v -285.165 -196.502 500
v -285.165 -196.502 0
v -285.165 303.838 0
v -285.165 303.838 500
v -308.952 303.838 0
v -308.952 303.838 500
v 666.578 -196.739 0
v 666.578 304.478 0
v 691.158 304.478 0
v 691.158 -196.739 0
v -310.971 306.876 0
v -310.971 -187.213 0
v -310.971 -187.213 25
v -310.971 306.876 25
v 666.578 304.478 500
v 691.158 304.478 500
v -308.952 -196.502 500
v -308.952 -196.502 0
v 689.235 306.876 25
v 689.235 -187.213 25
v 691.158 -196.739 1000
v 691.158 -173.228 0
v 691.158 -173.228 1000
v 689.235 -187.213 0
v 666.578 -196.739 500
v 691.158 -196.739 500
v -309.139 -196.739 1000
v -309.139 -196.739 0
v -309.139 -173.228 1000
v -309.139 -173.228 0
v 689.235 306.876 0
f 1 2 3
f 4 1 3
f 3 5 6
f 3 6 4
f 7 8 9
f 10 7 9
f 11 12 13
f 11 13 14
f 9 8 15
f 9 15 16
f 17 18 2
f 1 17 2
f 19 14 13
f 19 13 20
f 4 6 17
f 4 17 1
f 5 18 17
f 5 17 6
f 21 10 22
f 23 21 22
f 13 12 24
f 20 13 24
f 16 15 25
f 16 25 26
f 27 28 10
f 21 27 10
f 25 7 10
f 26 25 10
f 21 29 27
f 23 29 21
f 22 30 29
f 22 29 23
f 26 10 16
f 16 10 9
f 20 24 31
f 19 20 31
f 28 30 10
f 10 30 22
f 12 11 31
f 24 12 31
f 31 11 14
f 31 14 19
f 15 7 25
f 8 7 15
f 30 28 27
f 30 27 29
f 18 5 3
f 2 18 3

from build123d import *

# Parameters (mm, degrees)
F2_W     = 23.786694
F2_H     = 500.340388
F3_DEPTH = 500
F4_W     = 24.579943
F4_H     = 501.217544
F5_DEPTH = 500
F6_W     = 1000.297636
F6_H     = 23.511276
F7_DEPTH = 1000
F8_W     = 1000.206262
F8_H     = 494.088978
F9_DEPTH = 25


with BuildPart() as f3:
    # F2 (on face) → F3 (new body)
    with BuildSketch(Plane.XY):
        with Locations((-297.058418, 53.668119)):
            Rectangle(F2_W, F2_H)
    extrude(amount=F3_DEPTH)


with BuildPart() as f5:
    # F4 (on face) → F5 (new body)
    with BuildSketch(Plane.XY):
        with Locations((678.868323, 53.869456)):
            Rectangle(F4_W, F4_H)
    extrude(amount=F5_DEPTH)


with BuildPart() as f7:
    # F6 (on face) → F7 (new body)
    with BuildSketch(Plane.XY):
        with Locations((191.009477, -184.983678)):
            Rectangle(F6_W, F6_H)
    extrude(amount=F7_DEPTH)


with BuildPart() as f9:
    # F8 (on face) → F9 (new body)
    with BuildSketch(Plane.XY):
        with Locations((189.131901, 59.831932)):
            Rectangle(F8_W, F8_H)
    extrude(amount=F9_DEPTH)


solid = Compound([f3.part, f5.part, f7.part, f9.part])
